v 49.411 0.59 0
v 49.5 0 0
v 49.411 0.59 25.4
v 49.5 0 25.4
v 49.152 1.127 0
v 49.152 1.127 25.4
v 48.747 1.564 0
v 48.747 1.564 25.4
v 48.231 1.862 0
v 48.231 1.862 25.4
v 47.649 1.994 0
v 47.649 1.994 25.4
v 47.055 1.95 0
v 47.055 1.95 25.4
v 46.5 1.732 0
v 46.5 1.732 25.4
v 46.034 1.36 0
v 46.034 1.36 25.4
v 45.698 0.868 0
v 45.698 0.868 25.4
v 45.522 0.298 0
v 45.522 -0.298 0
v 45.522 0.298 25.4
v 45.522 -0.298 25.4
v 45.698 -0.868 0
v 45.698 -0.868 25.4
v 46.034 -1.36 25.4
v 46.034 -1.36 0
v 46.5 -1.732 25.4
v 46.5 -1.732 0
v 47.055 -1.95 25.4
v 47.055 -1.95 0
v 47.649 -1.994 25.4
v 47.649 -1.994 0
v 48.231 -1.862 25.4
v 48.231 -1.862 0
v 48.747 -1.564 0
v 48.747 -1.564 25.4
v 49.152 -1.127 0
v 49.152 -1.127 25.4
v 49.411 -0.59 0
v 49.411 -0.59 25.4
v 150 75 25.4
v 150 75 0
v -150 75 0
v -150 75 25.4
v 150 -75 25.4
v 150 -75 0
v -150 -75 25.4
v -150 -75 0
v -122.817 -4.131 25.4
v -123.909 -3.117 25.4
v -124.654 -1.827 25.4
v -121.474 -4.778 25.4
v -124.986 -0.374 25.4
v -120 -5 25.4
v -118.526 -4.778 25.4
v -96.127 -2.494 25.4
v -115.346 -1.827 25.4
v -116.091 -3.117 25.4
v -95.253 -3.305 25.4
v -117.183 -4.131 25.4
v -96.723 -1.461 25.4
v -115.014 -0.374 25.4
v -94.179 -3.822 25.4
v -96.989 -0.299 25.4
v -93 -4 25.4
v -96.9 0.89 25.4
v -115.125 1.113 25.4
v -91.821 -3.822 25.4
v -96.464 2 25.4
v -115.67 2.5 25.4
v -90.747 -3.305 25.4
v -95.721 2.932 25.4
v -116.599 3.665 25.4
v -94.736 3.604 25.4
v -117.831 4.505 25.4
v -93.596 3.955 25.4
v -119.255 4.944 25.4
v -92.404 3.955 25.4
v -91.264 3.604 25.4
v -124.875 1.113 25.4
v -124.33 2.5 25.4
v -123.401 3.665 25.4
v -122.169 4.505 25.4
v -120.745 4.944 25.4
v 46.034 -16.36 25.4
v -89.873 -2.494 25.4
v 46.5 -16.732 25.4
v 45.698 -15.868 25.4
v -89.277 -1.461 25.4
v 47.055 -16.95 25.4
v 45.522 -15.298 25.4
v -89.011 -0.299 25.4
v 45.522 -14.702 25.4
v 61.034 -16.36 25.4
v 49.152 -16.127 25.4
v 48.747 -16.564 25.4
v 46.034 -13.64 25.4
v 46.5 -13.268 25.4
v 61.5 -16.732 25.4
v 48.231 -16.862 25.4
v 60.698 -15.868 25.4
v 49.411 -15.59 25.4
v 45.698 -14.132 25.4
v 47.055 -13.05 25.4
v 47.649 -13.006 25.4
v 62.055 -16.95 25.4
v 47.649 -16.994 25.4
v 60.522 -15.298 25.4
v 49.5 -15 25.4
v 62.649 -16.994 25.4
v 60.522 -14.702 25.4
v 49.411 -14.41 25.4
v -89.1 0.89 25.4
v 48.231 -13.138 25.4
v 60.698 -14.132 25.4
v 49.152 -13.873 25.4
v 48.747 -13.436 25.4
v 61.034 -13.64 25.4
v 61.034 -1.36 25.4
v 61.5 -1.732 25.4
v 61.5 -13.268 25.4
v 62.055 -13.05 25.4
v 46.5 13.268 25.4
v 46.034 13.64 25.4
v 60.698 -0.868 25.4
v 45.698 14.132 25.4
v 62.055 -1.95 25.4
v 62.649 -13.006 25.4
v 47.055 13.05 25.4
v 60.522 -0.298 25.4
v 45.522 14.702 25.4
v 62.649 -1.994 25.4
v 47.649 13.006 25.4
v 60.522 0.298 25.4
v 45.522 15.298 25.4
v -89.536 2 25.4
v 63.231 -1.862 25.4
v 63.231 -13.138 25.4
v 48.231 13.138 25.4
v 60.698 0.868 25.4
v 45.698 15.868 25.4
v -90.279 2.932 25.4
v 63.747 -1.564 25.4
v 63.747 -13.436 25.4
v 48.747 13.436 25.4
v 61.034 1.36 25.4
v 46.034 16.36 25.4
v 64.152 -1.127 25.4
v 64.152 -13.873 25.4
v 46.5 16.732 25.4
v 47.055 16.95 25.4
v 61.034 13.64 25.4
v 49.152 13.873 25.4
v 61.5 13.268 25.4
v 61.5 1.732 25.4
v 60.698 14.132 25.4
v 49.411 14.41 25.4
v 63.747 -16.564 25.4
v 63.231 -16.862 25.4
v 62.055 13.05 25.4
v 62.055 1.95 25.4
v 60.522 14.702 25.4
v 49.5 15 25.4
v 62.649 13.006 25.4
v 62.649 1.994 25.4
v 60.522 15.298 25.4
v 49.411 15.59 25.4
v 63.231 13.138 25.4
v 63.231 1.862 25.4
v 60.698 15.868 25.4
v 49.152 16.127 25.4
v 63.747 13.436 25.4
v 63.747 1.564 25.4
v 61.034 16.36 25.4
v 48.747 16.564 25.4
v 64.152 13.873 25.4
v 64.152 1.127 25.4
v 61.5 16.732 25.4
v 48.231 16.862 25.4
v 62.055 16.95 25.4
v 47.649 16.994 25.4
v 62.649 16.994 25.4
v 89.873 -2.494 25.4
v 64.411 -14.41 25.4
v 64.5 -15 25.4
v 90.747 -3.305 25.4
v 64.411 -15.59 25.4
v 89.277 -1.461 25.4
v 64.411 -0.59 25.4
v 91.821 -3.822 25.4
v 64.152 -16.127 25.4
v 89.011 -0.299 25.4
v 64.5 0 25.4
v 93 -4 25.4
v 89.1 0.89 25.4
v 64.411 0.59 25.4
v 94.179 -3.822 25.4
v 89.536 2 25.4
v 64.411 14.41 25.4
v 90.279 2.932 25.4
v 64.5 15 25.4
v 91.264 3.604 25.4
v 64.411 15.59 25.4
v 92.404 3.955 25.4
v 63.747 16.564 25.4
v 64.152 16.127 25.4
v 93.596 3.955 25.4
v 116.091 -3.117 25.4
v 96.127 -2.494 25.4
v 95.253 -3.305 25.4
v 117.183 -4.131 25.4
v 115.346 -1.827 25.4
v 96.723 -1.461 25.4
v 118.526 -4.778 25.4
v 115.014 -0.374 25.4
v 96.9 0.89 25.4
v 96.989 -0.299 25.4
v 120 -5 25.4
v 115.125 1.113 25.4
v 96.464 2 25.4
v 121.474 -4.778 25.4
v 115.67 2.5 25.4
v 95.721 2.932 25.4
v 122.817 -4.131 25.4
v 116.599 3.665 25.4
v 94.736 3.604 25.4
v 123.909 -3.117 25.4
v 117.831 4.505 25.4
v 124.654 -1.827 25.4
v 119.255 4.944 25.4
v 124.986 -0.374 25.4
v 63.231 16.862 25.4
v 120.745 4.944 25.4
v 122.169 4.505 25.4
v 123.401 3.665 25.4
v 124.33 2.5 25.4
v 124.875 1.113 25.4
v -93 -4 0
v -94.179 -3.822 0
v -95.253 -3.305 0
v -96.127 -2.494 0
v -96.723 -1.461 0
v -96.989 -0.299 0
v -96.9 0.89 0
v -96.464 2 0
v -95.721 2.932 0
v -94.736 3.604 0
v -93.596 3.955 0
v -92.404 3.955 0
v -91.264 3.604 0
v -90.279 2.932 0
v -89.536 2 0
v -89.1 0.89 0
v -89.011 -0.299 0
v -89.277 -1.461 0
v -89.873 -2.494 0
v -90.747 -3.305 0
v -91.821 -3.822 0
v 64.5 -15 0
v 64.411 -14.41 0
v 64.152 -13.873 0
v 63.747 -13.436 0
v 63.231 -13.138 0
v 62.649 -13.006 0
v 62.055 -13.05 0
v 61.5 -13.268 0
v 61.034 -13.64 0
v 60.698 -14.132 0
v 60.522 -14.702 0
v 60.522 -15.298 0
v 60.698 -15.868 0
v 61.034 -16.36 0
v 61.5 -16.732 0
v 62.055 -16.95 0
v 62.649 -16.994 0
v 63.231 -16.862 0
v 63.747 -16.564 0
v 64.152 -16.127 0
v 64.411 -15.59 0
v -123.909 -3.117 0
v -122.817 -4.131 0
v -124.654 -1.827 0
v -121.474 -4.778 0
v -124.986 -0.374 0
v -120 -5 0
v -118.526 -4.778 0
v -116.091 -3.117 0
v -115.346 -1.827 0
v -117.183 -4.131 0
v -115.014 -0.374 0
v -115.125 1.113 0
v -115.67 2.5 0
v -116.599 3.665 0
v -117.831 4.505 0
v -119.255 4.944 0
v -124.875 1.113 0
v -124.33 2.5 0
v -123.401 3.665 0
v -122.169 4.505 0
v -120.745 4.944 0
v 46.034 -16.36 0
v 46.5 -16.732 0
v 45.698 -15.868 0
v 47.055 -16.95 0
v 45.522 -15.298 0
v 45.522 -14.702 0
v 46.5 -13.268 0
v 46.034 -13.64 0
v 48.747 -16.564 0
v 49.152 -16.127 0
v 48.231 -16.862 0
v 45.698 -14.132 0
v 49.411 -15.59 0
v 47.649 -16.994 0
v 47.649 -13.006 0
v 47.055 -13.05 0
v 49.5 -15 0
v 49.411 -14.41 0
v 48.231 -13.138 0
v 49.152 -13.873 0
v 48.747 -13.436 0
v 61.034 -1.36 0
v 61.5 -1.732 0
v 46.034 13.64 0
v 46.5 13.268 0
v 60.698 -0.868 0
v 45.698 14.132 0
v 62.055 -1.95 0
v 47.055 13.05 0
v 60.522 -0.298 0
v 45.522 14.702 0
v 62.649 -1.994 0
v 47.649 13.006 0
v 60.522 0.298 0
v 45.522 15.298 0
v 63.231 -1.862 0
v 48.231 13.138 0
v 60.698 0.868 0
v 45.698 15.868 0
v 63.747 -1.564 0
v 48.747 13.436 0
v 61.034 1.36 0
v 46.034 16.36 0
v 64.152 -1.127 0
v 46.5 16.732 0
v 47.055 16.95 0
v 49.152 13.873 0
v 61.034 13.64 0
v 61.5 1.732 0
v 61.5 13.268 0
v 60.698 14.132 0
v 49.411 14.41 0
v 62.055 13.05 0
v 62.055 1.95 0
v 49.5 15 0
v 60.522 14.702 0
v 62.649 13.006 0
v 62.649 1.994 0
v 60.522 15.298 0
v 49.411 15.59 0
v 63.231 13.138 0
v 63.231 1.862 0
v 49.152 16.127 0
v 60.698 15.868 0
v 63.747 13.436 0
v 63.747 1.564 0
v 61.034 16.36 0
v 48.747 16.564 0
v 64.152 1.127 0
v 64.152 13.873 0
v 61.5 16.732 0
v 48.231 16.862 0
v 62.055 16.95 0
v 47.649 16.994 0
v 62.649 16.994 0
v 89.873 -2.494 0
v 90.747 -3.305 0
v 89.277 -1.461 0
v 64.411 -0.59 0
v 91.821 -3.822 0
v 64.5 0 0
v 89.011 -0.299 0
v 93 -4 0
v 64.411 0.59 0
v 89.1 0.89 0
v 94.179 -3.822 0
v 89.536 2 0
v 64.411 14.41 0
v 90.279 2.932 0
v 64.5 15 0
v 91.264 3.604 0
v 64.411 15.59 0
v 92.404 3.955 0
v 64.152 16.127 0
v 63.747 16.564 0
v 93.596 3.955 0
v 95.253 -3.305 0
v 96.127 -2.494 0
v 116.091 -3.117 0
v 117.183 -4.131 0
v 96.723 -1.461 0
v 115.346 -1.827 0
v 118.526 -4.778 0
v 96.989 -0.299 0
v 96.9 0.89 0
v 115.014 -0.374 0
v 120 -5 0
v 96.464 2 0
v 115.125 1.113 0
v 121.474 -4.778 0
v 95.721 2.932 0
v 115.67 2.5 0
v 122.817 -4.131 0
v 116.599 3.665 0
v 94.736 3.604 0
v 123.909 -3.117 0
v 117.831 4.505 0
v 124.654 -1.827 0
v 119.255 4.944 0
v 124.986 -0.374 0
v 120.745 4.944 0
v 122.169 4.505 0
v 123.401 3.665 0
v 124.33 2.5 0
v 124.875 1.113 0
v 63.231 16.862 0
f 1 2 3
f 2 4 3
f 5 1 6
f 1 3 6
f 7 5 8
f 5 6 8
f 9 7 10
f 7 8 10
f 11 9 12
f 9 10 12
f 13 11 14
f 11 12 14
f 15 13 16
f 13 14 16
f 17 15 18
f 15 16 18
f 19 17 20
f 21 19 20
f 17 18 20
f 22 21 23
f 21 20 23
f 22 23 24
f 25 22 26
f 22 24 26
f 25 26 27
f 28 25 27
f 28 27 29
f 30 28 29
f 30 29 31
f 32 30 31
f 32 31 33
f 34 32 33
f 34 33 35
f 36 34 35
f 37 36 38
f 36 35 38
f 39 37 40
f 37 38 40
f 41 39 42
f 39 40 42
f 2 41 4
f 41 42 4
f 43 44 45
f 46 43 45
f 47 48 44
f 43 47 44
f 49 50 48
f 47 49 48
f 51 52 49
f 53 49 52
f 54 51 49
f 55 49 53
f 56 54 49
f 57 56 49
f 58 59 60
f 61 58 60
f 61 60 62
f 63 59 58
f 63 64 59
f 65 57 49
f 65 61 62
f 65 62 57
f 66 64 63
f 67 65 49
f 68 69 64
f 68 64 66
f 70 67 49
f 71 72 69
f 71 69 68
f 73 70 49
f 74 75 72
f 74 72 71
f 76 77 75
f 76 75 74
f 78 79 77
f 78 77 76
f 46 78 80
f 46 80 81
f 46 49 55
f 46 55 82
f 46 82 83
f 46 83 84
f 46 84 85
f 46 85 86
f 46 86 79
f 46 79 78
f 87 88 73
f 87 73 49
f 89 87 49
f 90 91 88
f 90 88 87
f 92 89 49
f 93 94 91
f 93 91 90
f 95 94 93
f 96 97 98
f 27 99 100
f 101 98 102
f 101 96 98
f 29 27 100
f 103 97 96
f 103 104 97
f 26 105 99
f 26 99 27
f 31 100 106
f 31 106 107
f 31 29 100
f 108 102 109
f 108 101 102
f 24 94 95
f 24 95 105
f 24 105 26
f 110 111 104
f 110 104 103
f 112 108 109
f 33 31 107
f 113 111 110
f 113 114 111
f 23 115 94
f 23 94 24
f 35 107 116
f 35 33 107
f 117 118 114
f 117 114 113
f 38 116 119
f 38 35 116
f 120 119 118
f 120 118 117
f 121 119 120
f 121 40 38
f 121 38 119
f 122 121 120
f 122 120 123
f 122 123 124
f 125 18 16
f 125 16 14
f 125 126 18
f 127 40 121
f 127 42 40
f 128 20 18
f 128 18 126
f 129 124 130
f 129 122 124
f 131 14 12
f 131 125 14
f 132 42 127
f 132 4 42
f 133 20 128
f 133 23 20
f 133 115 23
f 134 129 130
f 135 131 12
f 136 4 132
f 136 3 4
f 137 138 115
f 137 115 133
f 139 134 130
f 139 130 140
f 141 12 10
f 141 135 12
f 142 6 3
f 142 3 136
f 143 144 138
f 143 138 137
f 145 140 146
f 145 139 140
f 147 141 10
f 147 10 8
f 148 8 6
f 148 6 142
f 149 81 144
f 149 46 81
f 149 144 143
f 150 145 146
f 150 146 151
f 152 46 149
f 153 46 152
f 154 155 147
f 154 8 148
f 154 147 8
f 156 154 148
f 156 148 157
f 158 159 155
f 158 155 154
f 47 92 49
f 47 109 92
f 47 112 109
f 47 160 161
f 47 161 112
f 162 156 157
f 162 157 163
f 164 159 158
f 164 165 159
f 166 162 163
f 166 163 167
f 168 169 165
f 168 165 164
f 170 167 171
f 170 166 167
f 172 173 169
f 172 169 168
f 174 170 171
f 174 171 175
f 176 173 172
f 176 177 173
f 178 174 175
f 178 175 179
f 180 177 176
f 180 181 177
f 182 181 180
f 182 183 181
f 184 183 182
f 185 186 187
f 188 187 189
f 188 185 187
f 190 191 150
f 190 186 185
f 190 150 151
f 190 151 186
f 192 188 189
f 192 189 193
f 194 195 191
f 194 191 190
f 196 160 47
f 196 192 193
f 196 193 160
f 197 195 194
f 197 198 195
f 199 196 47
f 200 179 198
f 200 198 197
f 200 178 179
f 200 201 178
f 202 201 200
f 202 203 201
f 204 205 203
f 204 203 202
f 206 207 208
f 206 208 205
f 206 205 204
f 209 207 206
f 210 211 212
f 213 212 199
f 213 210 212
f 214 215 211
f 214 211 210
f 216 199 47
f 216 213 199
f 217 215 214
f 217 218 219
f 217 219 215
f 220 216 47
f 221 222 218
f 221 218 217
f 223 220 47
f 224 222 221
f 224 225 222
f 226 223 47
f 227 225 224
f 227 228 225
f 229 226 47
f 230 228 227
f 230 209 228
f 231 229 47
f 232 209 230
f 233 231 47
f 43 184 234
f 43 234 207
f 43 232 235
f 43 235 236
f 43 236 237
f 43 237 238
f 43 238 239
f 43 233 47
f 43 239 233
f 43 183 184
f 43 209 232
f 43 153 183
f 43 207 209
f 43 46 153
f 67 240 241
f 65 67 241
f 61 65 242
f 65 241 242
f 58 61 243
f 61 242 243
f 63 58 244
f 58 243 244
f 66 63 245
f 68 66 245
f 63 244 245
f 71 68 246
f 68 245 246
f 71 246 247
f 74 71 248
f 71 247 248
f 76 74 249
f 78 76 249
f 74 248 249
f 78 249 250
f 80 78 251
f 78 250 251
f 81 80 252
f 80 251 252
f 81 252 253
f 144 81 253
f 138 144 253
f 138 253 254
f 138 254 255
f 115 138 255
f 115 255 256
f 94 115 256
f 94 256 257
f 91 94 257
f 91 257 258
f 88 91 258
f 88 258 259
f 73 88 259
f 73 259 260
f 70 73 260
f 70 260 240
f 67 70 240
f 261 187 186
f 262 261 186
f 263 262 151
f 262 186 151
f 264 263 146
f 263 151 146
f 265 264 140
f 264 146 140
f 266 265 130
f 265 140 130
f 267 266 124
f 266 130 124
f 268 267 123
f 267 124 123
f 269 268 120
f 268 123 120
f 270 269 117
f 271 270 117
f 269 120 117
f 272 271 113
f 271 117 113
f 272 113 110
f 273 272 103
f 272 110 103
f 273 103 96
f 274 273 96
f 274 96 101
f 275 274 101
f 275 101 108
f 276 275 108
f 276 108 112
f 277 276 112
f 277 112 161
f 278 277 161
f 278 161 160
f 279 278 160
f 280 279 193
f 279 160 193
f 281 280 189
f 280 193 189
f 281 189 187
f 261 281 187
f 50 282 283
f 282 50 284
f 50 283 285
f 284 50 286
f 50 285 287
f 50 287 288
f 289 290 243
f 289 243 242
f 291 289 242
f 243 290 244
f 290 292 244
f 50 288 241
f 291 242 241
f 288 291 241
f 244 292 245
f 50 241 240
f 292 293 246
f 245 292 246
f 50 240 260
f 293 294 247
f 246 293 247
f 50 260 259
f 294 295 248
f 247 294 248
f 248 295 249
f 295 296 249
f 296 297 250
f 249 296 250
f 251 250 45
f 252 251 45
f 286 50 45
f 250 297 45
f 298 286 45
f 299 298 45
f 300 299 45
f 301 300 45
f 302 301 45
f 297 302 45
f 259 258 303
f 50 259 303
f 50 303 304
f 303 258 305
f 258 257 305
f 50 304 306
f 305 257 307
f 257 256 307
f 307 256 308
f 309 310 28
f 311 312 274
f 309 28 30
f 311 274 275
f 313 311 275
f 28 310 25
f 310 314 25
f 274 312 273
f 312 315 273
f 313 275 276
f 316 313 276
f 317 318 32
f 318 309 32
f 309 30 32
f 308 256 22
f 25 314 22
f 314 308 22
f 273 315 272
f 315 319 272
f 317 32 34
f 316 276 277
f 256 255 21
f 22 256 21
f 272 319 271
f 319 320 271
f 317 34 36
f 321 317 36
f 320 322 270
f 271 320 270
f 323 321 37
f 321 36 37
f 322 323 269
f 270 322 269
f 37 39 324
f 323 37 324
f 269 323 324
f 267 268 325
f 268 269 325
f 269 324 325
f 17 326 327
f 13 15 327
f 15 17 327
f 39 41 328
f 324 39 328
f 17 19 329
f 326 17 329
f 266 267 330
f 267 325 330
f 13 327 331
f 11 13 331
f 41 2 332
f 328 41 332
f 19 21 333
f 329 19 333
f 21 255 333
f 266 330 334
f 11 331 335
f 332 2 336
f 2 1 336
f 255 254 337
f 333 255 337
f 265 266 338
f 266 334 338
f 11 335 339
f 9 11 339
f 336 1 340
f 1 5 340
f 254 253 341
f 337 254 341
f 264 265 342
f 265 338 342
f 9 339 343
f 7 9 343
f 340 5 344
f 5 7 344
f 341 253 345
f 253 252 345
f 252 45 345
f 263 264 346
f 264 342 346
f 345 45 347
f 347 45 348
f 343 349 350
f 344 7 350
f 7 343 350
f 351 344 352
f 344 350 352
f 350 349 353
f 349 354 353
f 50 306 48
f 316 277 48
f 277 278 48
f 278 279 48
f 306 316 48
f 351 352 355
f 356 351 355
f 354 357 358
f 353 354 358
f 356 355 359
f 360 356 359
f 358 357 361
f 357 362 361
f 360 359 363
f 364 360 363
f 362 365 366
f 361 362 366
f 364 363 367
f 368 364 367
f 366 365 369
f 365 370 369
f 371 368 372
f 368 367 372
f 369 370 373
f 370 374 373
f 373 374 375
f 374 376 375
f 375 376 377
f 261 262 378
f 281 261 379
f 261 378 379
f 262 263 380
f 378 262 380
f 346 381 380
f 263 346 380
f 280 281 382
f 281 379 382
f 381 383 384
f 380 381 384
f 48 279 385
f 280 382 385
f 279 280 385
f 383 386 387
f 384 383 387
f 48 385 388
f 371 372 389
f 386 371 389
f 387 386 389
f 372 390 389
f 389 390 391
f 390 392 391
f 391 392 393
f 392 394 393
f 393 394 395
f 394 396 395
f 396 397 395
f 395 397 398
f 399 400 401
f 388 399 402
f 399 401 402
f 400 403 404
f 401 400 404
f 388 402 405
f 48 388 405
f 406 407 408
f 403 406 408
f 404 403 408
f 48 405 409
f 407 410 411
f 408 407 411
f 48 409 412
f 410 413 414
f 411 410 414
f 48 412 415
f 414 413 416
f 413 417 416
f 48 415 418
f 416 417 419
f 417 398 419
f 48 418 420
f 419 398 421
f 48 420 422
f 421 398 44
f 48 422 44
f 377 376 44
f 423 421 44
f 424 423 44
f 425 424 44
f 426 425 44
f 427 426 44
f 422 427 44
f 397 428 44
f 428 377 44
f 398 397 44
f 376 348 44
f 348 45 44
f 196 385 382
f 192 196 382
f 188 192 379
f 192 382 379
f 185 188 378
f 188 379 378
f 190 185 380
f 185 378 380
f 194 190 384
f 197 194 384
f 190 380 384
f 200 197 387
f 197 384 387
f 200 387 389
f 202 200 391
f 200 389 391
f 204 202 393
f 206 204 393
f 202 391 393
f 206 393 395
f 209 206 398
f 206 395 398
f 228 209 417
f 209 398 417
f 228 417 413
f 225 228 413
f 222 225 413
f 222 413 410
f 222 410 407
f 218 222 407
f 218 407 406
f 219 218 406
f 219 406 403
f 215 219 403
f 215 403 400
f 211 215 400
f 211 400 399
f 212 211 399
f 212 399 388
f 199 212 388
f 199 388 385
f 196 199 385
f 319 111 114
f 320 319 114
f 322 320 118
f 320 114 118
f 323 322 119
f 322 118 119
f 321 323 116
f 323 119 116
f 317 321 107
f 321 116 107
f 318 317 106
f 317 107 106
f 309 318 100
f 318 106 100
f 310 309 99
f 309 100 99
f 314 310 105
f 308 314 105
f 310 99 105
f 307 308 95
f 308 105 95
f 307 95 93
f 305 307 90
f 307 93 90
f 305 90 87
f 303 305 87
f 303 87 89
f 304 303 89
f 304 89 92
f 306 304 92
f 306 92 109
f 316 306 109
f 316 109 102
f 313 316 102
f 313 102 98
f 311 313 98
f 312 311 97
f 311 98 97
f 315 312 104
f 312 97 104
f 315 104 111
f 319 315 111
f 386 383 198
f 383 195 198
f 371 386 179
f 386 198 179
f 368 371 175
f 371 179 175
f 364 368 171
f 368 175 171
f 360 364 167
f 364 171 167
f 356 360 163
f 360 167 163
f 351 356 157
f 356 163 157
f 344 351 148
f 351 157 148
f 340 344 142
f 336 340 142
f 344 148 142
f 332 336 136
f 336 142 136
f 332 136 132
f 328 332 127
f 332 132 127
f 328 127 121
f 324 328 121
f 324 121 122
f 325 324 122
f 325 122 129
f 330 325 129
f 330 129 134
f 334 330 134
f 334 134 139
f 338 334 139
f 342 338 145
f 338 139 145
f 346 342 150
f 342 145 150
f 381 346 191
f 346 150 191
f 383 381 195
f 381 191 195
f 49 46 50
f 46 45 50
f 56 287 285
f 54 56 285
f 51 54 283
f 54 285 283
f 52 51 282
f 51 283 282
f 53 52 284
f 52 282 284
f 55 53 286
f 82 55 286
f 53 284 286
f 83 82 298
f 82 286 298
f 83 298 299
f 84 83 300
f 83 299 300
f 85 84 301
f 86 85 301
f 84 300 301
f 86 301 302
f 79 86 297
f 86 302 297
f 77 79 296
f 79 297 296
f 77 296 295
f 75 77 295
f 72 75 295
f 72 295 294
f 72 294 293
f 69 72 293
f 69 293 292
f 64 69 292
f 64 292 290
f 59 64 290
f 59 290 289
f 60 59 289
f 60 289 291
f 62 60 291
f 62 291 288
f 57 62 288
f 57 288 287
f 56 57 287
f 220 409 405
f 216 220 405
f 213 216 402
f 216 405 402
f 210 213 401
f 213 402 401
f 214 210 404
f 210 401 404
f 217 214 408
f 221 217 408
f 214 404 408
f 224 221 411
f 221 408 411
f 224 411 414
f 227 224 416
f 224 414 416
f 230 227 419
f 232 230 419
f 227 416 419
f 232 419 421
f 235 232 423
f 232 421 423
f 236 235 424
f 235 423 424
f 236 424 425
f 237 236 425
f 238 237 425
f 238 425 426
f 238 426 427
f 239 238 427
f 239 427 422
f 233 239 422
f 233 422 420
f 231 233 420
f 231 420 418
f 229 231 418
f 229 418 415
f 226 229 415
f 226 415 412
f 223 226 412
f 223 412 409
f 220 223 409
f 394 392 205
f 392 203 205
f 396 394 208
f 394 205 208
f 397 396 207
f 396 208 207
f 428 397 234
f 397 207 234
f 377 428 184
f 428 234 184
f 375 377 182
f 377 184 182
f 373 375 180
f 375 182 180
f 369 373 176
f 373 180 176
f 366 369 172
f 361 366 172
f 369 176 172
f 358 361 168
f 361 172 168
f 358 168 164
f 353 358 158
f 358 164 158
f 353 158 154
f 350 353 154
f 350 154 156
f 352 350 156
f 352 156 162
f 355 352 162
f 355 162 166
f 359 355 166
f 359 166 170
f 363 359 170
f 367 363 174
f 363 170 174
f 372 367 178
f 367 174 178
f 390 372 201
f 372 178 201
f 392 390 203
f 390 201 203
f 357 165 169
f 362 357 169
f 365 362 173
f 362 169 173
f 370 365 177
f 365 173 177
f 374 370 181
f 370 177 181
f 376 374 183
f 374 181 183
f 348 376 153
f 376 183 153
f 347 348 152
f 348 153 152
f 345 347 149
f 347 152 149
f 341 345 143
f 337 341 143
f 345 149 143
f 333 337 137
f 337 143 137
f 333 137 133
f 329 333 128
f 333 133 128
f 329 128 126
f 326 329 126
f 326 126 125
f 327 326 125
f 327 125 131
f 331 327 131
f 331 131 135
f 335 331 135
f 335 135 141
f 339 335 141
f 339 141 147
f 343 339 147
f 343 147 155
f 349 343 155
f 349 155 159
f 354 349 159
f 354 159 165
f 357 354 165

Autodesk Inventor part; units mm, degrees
ref_plane "YZ Plane" through (0, 0, 0) normal (1, 0, 0) x (0, 1, 0)
ref_plane "XZ Plane" through (0, 0, 0) normal (0, 1, 0) x (-1, 0, 0)
ref_plane "XY Plane" through (0, 0, 0) normal (0, 0, 1) x (1, 0, 0)
sketch "Sketch1" plane through (0, 0, 0) normal (0, 0, 1) x (1, 0, 0)
  line L0 (-150, -75) -> (150, -75)
  line L1 (150, -75) -> (150, 75)
  line L2 (150, 75) -> (-150, 75)
  line L3 (-150, 75) -> (-150, -75)
  line L4 (-150, -75) -> (150, 75) construction
  line L5 (150, -75) -> (-150, 75) construction
  point P0 (0, 0)
  dimension "d0" = 300
  dimension "d1" = 150
extrude "Extrusion1" add sketch "Sketch1" along normal blind 25.4
sketch "Sketch2" plane through (0, 0, 25.4) normal (0, 0, 1) x (1, 0, 0)
  line L0 (-120, 0) -> (120, 0)
  line L1 (-150, 75) -> (-150, -75) projected
  point P0 (0, 0)
  point P1 (0, 0)
  dimension "d4" = 30
hole "Hole1" at (-120, 0, 25.4) at (120, 0, 25.4) direction (0, 0, -1) diameter 10 end through all
sketch "Sketch3" plane through (0, 0, 25.4) normal (0, 0, 1) x (1, 0, 0)
  line L0 (-93, 0) -> (93, 0)
  point P0 (0, 0)
  point P1 (0, 0)
  dimension "d38" = 186
hole "Hole2" at (-93, 0, 25.4) at (93, 0, 25.4) direction (0, 0, -1) diameter 8 end through all
sketch "Sketch5" plane through (0, 0, 25.4) normal (0, 0, 1) x (1, 0, 0)
  line L0 (0, 0) -> (150, 0)
  line L1 (150, -75) -> (150, 75) projected
  circle A0 centre (47.5, 0) radius 2
  circle A1 centre (62.5, 0) radius 2
  dimension "d26" = 4
  dimension "d27" = 47.5
  dimension "d37" = 15
extrude "Extrusion2" cut sketch "Sketch5" against normal through all
pattern_linear "Rectangular Pattern1" count 2 spacing 15 along (0, -1, 0) count 2 spacing -15 along (0, -1, 0) of "Extrusion2"
properties part number "base de madera pequeña"
